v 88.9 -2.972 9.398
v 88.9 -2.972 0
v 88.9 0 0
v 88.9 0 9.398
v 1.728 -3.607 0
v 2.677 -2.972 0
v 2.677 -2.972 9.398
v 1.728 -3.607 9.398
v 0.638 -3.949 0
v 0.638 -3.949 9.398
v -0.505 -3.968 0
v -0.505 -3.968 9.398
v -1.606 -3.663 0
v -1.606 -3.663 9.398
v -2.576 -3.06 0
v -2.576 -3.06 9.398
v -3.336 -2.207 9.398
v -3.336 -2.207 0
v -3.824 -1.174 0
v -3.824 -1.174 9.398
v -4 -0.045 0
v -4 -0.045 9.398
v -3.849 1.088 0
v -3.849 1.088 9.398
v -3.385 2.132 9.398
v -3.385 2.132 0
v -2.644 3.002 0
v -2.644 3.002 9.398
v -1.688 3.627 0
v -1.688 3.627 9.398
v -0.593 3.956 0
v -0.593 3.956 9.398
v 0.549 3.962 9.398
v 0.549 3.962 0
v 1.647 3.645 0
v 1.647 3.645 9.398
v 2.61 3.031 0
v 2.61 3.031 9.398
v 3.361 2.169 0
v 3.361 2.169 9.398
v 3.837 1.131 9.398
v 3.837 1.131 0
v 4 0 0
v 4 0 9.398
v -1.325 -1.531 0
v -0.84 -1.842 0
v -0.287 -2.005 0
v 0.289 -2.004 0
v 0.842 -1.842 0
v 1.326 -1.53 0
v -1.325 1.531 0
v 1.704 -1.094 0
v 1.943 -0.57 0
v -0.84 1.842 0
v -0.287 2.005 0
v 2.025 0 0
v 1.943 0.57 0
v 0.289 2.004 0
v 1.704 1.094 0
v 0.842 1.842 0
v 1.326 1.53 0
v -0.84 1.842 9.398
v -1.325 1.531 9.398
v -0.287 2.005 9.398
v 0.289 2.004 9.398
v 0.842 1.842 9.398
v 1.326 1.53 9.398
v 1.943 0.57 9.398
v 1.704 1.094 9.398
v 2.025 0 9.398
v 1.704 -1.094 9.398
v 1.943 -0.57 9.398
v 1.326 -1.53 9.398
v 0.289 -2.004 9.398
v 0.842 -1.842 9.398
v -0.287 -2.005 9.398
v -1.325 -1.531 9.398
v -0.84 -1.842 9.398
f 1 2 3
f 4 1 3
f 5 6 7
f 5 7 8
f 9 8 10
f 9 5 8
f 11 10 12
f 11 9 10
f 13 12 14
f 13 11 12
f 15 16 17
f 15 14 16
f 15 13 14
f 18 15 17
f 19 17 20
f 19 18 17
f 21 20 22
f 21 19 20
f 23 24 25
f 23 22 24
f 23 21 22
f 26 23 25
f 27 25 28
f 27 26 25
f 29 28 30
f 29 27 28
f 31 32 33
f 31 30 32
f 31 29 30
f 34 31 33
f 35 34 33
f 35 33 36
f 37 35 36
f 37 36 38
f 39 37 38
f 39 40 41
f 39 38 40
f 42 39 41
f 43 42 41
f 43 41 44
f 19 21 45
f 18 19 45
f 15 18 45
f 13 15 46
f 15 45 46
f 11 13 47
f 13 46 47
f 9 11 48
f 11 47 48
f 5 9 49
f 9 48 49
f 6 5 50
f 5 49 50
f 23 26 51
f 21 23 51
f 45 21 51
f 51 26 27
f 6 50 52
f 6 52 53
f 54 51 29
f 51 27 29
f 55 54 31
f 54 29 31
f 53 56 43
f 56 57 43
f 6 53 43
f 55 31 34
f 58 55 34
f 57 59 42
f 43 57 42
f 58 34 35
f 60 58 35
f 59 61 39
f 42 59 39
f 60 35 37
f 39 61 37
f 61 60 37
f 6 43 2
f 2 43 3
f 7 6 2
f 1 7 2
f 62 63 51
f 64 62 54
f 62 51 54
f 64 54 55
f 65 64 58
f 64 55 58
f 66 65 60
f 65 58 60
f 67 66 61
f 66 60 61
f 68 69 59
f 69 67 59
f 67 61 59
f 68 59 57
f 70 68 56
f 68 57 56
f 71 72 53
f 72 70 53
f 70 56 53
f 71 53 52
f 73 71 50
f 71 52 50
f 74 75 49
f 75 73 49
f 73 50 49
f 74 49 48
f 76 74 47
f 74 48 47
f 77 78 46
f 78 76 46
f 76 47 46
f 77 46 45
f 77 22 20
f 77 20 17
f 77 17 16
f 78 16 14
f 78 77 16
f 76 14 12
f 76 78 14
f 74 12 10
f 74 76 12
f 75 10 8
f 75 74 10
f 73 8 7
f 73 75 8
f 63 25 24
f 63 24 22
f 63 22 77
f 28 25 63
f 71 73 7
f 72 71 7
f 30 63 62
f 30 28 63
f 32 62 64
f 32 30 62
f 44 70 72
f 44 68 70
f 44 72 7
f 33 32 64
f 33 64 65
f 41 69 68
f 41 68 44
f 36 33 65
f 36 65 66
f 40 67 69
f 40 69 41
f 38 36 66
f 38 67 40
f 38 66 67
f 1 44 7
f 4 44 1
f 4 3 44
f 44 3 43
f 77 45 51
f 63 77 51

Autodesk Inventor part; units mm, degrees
ref_plane "YZ Plane" through (0, 0, 0) normal (1, 0, 0) x (0, 1, 0)
ref_plane "XZ Plane" through (0, 0, 0) normal (0, 1, 0) x (-1, 0, 0)
ref_plane "XY Plane" through (0, 0, 0) normal (0, 0, 1) x (1, 0, 0)
sketch "Sketch1" plane through (0, 0, 0) normal (0, 0, 1) x (1, 0, 0)
  arc A0 (-1.325, -1.5313) -> (-1.325, 1.5313) centre (0, 0) ccw
  line L0 (-1.325, -1.5313) -> (-1.325, 1.5313)
  arc A1 (4, 0) -> (2.6774, -2.9718) centre (0, 0) ccw
  line L1 (2.6774, -2.9718) -> (88.9, -2.9718)
  line L2 (88.9, -2.9718) -> (88.9, 0)
  line L3 (88.9, 0) -> (4, 0)
  dimension "d0" = 4.05
  dimension "d2" = 8
  dimension "d3" = 3.35
  dimension "d5" = 88.9
  dimension "d7" = 2.9718
  dimension "d8" = 84.9
extrude "Extrusion1" add sketch "Sketch1" along normal blind 9.398
properties part number "Rotator2"
